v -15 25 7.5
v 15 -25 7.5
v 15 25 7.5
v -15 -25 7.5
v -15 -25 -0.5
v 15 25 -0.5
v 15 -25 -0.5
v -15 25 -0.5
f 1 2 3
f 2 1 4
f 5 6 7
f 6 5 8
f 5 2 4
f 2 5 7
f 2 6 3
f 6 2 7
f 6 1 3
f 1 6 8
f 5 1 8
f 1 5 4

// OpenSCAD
//drivebase caster wheel
caster_wheel_radius=25;
caster_wheel_width=20;
caster_wheel_offset=25;
caster_wheel_mountx=30;
caster_wheel_mounty=50;
caster_wheel_mountz=2;
caster_wheel_cylinder_radius=35/2;
caster_wheel_cylinder_height=8;
caster_wheel_base_width=35;
caster_wheel_base_length=50;
caster_wheel_base_height=40;
caster_wheel_axe_offset=7;
caster_wheel_axe=5;
caster_wheel_axe_length=25;
caster_wheel_tap=7;
caster_wheel_tap_offset=5;

module caster_wheel() {
/*
	//alternate-different-size
	//color ("lightgreen") translate([0,137,0]) scale([6.3,6.3,6.3]) rotate ([90,0,270]) import("casterwheel.stl");
	difference() {
	union() {
	// wheel
	rotate ([0,90,0]) translate ([0,0,-caster_wheel_width/2]) cylinder(caster_wheel_width,caster_wheel_radius,caster_wheel_radius);
	// axe
	rotate ([0,90,0]) translate ([0,0,-caster_wheel_axe_length/2]) cylinder(caster_wheel_axe_length,caster_wheel_axe/2,caster_wheel_axe/2);
	// mount plate
	translate ([0,caster_wheel_offset,caster_wheel_base_height-caster_wheel_axe_offset+caster_wheel_cylinder_height]) cube ([caster_wheel_mountx,caster_wheel_mounty,caster_wheel_mountz],true);
	// cylinder
	translate ([0,caster_wheel_offset,caster_wheel_base_height-caster_wheel_axe_offset-caster_wheel_mountz/2]) cylinder (caster_wheel_cylinder_height,caster_wheel_cylinder_radius,caster_wheel_cylinder_radius);
	// base plate
	hull() {
		translate ([0,caster_wheel_offset-caster_wheel_tap_offset*2,caster_wheel_base_width/2-caster_wheel_axe_offset+caster_wheel_axe/2+12]) cube ([caster_wheel_base_width,caster_wheel_base_length,15],true);
		translate ([0,caster_wheel_offset-caster_wheel_tap_offset*2-15,caster_wheel_base_width/2-caster_wheel_axe_offset+caster_wheel_axe/2]) cube ([caster_wheel_base_width,15,caster_wheel_base_height],true);
	}
*/
	// filler socket for caster wheel mount plate
	color ("red") translate ([0,caster_wheel_offset,caster_wheel_base_height-caster_wheel_axe_offset+caster_wheel_cylinder_height+caster_wheel_mountz+2.5]) cube ([caster_wheel_mountx,caster_wheel_mounty,6+caster_wheel_mountz],true);
/*   }
	// TAPS
	union() {
		translate ([-caster_wheel_mountx/2+caster_wheel_tap_offset,caster_wheel_offset-caster_wheel_mounty/2+caster_wheel_tap_offset,caster_wheel_base_height-caster_wheel_axe_offset+caster_wheel_cylinder_height-1]) cylinder (caster_wheel_mountz+7+caster_wheel_mountz,caster_wheel_tap/2,caster_wheel_tap/2);
		translate ([caster_wheel_mountx/2-caster_wheel_tap_offset,caster_wheel_offset-caster_wheel_mounty/2+caster_wheel_tap_offset,caster_wheel_base_height-caster_wheel_axe_offset+caster_wheel_cylinder_height-1]) cylinder (caster_wheel_mountz+7+caster_wheel_mountz,caster_wheel_tap/2,caster_wheel_tap/2);
		translate ([-caster_wheel_mountx/2+caster_wheel_tap_offset,caster_wheel_offset+caster_wheel_mounty/2-caster_wheel_tap_offset,caster_wheel_base_height-caster_wheel_axe_offset+caster_wheel_cylinder_height-1]) cylinder (caster_wheel_mountz+7+caster_wheel_mountz,caster_wheel_tap/2,caster_wheel_tap/2);
		translate ([caster_wheel_mountx/2-caster_wheel_tap_offset,caster_wheel_offset+caster_wheel_mounty/2-caster_wheel_tap_offset,caster_wheel_base_height-caster_wheel_axe_offset+caster_wheel_cylinder_height-1]) cylinder (caster_wheel_mountz+7+caster_wheel_mountz,caster_wheel_tap/2,caster_wheel_tap/2);
	}
	}
*/
}

universal_board_length=85;
universal_board_width=115;
universal_board_height=1.5;
universal_board_outline=2.5;
universal_board_holder=10;
module universal_board_holder() {
	translate ([0,0,universal_board_height/2]) cube([universal_board_length+universal_board_outline*2,universal_board_width+universal_board_outline*2,universal_board_height],true);
	translate ([universal_board_length/2,(-universal_board_width-universal_board_outline*2)/2,universal_board_height]) cube([universal_board_outline,universal_board_width+universal_board_outline*2,universal_board_holder]);
	translate ([-universal_board_length/2-universal_board_outline,(-universal_board_width-universal_board_outline*2)/2,universal_board_height]) cube([universal_board_outline,universal_board_width+universal_board_outline*2,universal_board_holder]);
	translate ([-universal_board_length/2-universal_board_outline,(-universal_board_width-universal_board_outline*2)/2,universal_board_height]) cube([universal_board_length+universal_board_outline*2,universal_board_outline,universal_board_holder]);
	translate ([-universal_board_length/2-universal_board_outline,universal_board_width/2,universal_board_height]) cube([universal_board_length+universal_board_outline*2,universal_board_outline,universal_board_holder]);
}
//universal_board_holder();

module upper_holder() {
 union() {
translate([0,-37,148]) color ("red") linear_extrude(height = 3, center = false, convexity = 10, twist = 0, $fn = 100) polygon([[-40,-40],[40,-40],[75,50],[-75,50]]);
color ("blue") translate([0,13,143.5]) cube([150,3,15],true);
 }
}

module bat_holder() {
bat_holder_length=150;
bat_holder_width=3;
bat_holder_height=115;
bat_holder_bottom_width=16;
color ("blue") translate([0,79,86]) cube([bat_holder_length,bat_holder_width,bat_holder_height],true);
color ("green") translate([0,88,30]) cube([bat_holder_length,bat_holder_bottom_width,bat_holder_width],true);
}

module bat_upper() {
bat_upper_length=150;
bat_upper_width=3;
bat_upper_height=15;
bat_upper_bottom_width=60;
color ("lightblue") translate([0,16.5,143.5]) cube([bat_upper_length,bat_upper_width,bat_upper_height],true);
color ("lightblue") translate([0,75.5,139.7]) cube([bat_upper_length,bat_upper_width,bat_upper_height-7.5],true);
color ("green") translate([0,46,137.5]) cube([bat_upper_length,bat_upper_bottom_width,bat_upper_width],true);
}


translate([0,-25,-42]) caster_wheel();
